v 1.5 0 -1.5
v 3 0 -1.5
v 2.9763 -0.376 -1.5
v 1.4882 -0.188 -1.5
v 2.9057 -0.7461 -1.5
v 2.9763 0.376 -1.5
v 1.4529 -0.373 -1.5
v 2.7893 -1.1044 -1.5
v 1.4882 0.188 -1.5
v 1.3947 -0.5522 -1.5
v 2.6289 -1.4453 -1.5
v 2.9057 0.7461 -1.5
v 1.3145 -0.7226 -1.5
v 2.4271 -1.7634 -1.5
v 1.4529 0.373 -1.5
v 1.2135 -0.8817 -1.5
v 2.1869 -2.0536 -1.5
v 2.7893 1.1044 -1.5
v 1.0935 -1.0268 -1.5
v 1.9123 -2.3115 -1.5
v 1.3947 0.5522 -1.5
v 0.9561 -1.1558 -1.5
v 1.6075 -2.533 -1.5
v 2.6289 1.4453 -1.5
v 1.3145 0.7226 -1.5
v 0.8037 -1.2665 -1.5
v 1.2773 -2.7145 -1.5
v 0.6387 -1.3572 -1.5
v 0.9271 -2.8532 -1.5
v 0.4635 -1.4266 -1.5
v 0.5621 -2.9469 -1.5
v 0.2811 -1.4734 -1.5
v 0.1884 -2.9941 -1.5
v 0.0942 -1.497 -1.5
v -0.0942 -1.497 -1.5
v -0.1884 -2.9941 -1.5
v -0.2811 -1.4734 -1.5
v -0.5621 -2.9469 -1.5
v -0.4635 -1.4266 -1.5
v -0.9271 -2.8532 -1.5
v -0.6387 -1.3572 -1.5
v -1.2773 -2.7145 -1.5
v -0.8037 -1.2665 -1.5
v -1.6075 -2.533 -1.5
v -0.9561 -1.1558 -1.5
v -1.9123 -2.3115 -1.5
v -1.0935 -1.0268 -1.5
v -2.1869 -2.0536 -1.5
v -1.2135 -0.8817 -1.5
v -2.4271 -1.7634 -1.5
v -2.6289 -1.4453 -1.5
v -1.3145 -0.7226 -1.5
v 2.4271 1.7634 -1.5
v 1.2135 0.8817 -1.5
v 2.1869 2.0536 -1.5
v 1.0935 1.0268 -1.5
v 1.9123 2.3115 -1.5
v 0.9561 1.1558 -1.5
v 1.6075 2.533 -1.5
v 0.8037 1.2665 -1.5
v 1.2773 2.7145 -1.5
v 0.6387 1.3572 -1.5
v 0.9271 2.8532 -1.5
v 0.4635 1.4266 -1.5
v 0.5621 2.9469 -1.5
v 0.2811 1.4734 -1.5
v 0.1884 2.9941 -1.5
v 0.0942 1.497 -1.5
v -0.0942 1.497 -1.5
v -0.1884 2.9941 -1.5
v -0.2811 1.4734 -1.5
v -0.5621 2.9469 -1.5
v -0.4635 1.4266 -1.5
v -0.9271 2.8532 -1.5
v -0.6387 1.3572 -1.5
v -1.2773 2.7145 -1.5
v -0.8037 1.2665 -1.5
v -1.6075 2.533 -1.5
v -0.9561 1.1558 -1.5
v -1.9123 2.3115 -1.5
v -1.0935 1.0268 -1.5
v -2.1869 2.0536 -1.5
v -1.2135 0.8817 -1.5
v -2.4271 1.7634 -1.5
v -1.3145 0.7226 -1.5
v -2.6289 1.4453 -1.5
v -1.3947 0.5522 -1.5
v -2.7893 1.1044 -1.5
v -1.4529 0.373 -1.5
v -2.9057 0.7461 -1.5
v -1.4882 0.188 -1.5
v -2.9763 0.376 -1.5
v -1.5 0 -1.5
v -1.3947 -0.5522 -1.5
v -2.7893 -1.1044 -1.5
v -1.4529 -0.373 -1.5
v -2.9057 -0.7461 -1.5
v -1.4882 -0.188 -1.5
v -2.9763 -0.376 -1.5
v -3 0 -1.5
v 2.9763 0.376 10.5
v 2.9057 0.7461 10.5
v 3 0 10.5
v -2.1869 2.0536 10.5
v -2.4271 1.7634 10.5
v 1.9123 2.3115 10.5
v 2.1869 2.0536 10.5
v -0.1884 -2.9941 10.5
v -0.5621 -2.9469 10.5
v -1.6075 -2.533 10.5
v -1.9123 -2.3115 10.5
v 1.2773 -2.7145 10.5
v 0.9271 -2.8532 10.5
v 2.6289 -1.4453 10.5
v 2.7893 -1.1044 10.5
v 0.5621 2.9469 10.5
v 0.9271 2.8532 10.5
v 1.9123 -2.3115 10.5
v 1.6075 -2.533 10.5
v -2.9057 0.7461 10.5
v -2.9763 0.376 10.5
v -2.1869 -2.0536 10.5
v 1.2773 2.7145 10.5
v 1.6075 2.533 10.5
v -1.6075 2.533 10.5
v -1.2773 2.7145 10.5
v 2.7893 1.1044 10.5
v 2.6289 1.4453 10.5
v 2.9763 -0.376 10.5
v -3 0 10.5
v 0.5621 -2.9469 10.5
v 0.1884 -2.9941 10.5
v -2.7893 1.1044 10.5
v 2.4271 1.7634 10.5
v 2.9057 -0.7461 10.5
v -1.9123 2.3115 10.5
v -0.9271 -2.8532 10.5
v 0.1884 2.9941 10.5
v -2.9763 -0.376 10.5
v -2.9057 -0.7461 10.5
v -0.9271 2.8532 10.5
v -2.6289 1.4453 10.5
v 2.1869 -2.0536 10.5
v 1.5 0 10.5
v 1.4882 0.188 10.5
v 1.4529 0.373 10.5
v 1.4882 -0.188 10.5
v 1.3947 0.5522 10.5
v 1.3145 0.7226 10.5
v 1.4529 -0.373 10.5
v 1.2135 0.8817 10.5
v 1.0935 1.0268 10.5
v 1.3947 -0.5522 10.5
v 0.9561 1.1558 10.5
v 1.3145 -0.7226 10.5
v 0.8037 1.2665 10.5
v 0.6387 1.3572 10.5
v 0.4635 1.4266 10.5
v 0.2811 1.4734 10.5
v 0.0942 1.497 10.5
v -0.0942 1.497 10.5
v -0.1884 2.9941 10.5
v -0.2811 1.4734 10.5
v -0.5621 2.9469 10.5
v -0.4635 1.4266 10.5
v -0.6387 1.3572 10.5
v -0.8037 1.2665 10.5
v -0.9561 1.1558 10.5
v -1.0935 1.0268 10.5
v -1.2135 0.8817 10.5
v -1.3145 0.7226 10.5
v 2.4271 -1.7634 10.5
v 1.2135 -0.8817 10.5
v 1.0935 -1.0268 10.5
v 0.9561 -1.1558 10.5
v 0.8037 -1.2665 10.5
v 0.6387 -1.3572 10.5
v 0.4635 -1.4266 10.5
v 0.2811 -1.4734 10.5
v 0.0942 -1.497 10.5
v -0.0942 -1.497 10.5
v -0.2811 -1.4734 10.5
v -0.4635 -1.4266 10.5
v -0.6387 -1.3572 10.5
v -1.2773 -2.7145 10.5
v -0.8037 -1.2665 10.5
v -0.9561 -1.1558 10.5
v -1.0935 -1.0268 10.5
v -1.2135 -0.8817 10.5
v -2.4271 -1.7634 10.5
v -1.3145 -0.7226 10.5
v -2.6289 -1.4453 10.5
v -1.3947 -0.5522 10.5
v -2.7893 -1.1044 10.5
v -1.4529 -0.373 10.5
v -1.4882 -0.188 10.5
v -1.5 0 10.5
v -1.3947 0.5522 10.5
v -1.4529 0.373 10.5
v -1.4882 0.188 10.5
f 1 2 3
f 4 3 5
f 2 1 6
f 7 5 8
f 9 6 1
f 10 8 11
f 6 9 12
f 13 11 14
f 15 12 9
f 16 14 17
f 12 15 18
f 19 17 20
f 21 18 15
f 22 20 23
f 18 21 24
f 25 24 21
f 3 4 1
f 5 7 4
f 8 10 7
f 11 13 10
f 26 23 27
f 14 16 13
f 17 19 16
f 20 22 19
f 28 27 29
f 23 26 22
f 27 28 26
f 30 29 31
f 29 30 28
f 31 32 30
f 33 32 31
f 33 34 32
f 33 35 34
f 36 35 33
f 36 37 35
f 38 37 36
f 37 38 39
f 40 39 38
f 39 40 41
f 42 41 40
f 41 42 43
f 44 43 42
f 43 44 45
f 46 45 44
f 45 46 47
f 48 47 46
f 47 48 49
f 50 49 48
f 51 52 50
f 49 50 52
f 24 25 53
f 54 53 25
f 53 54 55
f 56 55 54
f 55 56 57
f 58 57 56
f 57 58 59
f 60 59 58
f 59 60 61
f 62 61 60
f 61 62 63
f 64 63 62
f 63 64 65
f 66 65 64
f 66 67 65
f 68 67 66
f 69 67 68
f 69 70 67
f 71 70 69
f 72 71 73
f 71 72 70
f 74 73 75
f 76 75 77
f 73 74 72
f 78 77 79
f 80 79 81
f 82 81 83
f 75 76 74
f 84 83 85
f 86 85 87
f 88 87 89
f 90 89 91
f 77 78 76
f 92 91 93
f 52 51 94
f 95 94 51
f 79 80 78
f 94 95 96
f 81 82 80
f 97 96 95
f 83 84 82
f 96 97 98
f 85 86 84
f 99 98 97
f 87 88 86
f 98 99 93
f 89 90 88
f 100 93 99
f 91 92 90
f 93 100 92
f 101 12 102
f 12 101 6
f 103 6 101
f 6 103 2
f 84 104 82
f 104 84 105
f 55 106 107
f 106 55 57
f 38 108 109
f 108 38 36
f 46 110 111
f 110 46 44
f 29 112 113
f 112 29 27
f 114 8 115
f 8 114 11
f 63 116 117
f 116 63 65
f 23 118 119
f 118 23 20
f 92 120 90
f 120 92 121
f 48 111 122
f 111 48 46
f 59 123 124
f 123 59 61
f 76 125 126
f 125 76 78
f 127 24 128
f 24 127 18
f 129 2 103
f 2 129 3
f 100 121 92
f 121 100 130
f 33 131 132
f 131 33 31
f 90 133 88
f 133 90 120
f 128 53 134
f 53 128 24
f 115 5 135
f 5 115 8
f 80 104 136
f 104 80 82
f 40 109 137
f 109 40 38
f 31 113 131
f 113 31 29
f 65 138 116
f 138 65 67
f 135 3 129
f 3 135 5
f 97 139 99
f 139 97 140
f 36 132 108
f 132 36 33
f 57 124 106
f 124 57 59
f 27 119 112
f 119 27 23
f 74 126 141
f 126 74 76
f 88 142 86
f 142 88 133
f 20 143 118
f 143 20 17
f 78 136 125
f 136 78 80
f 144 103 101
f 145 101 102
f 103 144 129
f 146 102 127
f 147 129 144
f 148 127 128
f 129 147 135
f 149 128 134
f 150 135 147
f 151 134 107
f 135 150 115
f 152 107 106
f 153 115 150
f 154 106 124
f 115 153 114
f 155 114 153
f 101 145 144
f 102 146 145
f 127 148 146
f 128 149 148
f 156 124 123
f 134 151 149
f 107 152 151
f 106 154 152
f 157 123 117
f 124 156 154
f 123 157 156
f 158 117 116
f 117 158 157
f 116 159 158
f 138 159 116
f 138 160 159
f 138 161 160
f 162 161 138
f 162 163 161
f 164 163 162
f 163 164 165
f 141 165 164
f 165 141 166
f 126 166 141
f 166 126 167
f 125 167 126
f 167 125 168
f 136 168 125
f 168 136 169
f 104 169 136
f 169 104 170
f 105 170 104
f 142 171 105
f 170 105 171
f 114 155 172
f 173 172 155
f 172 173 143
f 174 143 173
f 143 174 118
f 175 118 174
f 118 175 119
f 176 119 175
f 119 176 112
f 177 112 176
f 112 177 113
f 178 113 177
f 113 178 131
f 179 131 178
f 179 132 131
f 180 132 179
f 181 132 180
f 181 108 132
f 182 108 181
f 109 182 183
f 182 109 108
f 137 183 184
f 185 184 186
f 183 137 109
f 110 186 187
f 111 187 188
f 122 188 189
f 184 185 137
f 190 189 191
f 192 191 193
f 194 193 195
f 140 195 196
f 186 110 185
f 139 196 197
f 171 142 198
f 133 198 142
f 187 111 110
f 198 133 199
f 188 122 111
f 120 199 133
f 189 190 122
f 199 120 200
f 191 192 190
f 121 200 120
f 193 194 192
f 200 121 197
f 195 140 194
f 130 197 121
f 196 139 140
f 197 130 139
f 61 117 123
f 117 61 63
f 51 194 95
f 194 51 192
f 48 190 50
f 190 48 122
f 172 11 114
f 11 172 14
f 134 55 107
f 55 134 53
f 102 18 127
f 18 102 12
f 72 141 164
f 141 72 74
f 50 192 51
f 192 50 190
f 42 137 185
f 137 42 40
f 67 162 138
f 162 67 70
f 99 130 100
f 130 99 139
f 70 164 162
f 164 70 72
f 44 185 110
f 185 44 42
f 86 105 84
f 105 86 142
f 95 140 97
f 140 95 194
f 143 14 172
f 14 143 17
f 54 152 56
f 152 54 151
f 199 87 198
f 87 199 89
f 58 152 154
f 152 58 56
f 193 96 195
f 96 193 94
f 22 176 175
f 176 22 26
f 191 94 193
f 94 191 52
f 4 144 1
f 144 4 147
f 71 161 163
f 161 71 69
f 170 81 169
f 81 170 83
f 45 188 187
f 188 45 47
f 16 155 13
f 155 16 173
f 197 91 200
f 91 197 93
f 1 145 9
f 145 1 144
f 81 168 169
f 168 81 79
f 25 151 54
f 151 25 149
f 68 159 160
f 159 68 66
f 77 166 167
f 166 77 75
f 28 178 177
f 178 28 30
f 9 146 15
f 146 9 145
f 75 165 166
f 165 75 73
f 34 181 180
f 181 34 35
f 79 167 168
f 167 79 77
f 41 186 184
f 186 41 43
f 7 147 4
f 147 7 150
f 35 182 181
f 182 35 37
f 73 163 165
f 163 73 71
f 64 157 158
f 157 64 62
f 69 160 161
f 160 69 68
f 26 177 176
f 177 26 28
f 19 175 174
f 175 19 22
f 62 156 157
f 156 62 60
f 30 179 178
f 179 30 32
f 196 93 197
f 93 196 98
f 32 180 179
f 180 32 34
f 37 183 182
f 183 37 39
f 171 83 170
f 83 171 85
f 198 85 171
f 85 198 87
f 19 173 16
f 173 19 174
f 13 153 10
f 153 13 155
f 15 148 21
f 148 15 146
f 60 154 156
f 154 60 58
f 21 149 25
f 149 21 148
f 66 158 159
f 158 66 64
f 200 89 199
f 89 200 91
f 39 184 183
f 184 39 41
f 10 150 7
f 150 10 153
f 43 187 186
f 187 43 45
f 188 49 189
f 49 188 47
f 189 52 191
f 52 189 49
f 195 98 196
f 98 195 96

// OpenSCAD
$fn = 50;


difference() {
	union() {
		translate(v = [0, 0, -1.5000000000]) {
			cylinder(h = 3, r = 1.0000000000);
		}
		translate(v = [0, 0, -1.5000000000]) {
			cylinder(h = 12, r = 3.0000000000);
		}
	}
	union() {
		translate(v = [0, 0, -100.0000000000]) {
			cylinder(h = 200, r = 1.5000000000);
		}
	}
}
